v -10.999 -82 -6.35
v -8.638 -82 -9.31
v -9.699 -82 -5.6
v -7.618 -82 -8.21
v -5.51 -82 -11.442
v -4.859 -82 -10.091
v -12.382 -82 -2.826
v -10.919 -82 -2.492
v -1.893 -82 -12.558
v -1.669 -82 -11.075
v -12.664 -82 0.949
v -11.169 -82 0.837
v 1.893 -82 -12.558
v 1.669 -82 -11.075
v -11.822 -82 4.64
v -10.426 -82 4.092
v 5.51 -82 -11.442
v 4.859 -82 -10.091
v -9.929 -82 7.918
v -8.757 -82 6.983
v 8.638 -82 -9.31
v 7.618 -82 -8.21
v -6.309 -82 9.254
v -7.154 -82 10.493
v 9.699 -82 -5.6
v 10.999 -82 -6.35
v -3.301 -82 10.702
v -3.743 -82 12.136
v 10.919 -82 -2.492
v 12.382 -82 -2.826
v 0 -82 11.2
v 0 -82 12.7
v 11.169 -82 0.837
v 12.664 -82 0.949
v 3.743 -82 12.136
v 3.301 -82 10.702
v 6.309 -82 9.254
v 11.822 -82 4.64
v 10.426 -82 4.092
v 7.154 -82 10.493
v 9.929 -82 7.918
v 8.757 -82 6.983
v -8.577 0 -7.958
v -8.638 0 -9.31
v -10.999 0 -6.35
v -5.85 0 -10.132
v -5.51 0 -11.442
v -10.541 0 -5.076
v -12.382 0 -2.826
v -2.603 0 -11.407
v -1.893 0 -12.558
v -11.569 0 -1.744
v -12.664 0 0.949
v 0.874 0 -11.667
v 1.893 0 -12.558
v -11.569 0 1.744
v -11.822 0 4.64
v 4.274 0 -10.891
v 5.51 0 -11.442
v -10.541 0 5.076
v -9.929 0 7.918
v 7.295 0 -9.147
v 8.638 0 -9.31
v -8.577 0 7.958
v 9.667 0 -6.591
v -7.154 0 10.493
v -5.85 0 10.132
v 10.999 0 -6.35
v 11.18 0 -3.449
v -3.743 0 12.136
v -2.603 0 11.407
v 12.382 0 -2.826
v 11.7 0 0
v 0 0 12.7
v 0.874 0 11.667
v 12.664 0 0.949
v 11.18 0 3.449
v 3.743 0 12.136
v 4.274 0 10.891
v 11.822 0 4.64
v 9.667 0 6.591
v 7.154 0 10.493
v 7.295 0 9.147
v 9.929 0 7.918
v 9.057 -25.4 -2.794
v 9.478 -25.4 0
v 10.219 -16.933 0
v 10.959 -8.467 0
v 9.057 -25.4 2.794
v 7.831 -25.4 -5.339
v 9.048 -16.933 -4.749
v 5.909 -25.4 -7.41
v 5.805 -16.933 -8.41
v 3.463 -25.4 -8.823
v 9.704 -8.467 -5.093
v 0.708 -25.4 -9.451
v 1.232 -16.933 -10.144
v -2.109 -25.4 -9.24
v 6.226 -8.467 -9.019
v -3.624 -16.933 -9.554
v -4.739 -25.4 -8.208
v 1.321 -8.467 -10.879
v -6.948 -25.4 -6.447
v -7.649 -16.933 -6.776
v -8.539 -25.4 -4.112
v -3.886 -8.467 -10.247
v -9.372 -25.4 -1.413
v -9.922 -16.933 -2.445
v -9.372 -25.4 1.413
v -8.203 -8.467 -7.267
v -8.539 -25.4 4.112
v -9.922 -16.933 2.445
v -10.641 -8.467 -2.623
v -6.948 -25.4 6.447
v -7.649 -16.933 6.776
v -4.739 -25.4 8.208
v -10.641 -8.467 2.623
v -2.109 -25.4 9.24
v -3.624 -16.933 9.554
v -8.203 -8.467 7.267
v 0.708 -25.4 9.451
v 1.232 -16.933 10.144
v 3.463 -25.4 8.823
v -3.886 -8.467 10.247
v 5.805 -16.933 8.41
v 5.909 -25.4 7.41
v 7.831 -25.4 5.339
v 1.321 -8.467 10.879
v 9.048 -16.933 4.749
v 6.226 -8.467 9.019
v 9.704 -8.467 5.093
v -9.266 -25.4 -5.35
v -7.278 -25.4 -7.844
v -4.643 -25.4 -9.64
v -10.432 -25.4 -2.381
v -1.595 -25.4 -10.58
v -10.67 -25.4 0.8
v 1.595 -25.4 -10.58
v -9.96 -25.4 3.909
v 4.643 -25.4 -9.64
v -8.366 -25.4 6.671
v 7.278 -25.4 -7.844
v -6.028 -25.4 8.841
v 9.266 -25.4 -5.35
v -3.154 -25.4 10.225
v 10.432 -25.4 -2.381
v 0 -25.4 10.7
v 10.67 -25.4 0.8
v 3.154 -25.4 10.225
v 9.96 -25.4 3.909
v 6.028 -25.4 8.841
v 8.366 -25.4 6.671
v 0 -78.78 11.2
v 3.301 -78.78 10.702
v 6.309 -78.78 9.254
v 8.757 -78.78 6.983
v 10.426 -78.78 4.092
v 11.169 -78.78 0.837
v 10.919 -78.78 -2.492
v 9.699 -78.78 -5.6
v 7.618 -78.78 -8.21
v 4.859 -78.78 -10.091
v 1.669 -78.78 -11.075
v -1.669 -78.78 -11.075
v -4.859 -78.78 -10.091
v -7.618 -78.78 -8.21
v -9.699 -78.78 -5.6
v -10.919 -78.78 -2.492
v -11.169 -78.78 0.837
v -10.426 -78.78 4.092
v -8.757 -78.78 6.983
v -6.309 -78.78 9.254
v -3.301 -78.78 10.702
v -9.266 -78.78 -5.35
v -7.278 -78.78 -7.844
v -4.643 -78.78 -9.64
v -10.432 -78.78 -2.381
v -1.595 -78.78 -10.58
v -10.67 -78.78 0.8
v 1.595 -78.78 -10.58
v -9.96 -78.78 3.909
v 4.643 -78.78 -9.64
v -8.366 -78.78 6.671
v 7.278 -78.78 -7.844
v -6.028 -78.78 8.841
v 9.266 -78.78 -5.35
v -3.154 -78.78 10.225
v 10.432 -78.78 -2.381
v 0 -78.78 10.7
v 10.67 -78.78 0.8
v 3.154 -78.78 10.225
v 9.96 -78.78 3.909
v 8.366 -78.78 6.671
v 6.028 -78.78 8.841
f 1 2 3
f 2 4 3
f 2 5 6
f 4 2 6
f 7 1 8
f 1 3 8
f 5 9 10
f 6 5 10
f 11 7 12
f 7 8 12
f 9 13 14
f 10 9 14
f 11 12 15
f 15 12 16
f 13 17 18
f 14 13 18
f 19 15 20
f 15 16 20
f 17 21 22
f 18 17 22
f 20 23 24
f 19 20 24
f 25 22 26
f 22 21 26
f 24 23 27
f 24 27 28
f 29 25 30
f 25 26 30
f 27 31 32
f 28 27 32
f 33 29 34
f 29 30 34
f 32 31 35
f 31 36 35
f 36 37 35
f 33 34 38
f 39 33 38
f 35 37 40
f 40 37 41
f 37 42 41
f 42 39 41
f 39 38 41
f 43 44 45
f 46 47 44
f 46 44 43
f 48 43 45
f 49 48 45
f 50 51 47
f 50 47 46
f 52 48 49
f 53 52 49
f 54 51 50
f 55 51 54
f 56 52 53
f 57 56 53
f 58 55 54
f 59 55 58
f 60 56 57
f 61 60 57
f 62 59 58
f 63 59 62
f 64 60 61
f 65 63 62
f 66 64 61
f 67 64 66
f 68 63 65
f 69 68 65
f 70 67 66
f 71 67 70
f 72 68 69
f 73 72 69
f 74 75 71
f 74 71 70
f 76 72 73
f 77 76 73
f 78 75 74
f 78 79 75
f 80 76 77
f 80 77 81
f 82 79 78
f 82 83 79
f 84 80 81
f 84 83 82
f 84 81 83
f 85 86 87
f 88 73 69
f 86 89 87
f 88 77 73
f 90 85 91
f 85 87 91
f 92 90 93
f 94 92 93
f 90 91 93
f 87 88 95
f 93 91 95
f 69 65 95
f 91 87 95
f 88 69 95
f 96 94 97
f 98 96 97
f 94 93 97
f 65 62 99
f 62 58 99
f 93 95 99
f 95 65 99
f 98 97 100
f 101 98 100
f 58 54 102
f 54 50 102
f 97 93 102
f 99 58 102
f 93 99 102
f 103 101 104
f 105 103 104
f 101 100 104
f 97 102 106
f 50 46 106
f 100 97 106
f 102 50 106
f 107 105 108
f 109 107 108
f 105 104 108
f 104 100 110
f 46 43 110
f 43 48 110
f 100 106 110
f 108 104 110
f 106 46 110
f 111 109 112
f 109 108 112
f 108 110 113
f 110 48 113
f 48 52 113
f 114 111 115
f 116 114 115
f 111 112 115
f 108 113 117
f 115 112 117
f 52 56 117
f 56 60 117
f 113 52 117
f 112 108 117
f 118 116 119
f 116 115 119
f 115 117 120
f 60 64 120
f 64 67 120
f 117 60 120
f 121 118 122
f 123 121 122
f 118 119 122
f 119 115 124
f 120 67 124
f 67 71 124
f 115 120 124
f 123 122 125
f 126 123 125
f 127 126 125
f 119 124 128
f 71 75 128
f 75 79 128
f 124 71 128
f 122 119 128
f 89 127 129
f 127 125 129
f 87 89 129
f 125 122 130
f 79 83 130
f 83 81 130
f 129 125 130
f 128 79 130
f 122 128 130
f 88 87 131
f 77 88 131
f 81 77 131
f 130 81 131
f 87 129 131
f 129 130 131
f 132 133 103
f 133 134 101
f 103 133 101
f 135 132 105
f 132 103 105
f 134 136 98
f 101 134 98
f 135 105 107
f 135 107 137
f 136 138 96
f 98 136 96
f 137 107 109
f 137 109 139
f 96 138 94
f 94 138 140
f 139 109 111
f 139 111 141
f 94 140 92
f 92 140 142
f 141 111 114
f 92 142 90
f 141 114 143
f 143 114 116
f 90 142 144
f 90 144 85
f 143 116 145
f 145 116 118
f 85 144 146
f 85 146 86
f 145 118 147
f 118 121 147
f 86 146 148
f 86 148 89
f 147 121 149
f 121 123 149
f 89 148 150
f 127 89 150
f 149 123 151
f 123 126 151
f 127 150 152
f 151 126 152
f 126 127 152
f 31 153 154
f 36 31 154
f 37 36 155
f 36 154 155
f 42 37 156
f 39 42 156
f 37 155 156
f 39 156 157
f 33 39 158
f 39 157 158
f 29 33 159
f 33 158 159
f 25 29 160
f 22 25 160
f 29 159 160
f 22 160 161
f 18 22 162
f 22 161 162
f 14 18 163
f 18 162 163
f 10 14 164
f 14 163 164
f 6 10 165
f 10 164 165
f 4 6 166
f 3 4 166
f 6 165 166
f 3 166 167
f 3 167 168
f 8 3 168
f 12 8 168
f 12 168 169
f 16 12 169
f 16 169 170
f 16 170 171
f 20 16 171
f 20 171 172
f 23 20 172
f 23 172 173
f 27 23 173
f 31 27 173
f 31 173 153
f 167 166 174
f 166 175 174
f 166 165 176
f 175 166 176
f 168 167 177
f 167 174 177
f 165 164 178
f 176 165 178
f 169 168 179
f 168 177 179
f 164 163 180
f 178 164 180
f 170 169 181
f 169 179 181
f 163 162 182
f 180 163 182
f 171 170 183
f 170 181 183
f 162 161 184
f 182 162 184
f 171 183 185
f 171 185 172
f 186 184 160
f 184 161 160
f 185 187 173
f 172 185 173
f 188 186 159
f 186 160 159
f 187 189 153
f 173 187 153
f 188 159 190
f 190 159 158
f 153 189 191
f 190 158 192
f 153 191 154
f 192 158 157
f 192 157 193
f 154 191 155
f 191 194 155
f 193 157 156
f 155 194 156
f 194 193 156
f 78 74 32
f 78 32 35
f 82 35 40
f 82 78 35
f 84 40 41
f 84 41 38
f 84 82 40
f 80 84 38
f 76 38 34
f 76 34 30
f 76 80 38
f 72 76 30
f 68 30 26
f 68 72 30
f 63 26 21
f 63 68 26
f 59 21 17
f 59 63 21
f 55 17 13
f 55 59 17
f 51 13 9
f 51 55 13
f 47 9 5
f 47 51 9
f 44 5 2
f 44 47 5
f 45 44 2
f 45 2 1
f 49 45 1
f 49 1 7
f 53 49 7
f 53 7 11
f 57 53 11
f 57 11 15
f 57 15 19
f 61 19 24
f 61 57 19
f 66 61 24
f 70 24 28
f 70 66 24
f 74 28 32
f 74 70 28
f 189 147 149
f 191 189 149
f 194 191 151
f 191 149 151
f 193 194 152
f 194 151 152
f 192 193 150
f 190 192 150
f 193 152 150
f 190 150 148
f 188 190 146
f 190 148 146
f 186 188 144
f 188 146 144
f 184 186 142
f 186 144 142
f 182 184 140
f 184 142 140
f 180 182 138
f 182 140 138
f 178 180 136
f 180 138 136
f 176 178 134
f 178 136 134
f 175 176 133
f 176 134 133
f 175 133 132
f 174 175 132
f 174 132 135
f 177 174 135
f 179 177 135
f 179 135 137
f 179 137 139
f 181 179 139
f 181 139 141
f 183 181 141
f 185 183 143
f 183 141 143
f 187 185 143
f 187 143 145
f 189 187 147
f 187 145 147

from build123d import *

# Parameters (mm, degrees)
SKETCH1_R           = 12.7
BOSS_EXTRUDE1_DEPTH = 82
SKETCH2_R           = 11.7
CUT_EXTRUDE1_DEPTH  = 25.4
CUT_EXTRUDE1_DRAFT  = -5
SKETCH3_R           = 10.7
CUT_EXTRUDE2_DEPTH  = 53.38
SKETCH4_R           = 11.2
CUT_EXTRUDE3_DEPTH  = 81.801413354


with BuildPart() as part:
    # Sketch1 → Boss-Extrude1 (new body)
    with BuildSketch(Plane(origin=(0, 0, 0), x_dir=(1, 0, 0), z_dir=(0, 1, 0))):
        with Locations(Location((0, 0, 0), (0, 0, 270))):
            Circle(SKETCH1_R)
    extrude(amount=-BOSS_EXTRUDE1_DEPTH)


with BuildPart() as cut_extrude1_tool:
    # Sketch2 → Cut-Extrude1 (with draft: the straight prism first)
    with BuildSketch(Plane(origin=(0, 0, 0), x_dir=(1, 0, 0), z_dir=(0, 1, 0))):
        Circle(SKETCH2_R)
    extrude(amount=-CUT_EXTRUDE1_DEPTH)
    # Cut-Extrude1: the draft: its side faces are tilted about the plane it starts from
    cut_extrude1_sides = [cut_extrude1_tool.faces().sort_by_distance(p)[0] for p in [
        (-11.7, -12.7, 0),
    ]]
    draft(cut_extrude1_sides, Plane(origin=(0, 0, 0), x_dir=(1, 0, 0), z_dir=(0, 1, 0)), CUT_EXTRUDE1_DRAFT)


with BuildPart() as part_1:
    add(part.part)

    # Cut-Extrude1: cut by cut_extrude1_tool
    add(cut_extrude1_tool.part, mode=Mode.SUBTRACT)

    # Sketch3 → Cut-Extrude2 (cut)
    with BuildSketch(Plane(origin=(0, -25.4, 0), x_dir=(1, 0, 0), z_dir=(0, 1, 0))):
        with Locations(Location((0, 0, 0), (0, 0, 270))):
            Circle(SKETCH3_R)
    extrude(amount=-CUT_EXTRUDE2_DEPTH, mode=Mode.SUBTRACT)

    # Sketch4 → Cut-Extrude3 (cut, through all)
    with BuildSketch(Plane(origin=(0, -78.78, 0), x_dir=(1, 0, 0), z_dir=(0, 1, 0))):
        with Locations(Location((0, 0, 0), (0, 0, 270))):
            Circle(SKETCH4_R)
    extrude(amount=-CUT_EXTRUDE3_DEPTH, mode=Mode.SUBTRACT)


solid = part_1.part
